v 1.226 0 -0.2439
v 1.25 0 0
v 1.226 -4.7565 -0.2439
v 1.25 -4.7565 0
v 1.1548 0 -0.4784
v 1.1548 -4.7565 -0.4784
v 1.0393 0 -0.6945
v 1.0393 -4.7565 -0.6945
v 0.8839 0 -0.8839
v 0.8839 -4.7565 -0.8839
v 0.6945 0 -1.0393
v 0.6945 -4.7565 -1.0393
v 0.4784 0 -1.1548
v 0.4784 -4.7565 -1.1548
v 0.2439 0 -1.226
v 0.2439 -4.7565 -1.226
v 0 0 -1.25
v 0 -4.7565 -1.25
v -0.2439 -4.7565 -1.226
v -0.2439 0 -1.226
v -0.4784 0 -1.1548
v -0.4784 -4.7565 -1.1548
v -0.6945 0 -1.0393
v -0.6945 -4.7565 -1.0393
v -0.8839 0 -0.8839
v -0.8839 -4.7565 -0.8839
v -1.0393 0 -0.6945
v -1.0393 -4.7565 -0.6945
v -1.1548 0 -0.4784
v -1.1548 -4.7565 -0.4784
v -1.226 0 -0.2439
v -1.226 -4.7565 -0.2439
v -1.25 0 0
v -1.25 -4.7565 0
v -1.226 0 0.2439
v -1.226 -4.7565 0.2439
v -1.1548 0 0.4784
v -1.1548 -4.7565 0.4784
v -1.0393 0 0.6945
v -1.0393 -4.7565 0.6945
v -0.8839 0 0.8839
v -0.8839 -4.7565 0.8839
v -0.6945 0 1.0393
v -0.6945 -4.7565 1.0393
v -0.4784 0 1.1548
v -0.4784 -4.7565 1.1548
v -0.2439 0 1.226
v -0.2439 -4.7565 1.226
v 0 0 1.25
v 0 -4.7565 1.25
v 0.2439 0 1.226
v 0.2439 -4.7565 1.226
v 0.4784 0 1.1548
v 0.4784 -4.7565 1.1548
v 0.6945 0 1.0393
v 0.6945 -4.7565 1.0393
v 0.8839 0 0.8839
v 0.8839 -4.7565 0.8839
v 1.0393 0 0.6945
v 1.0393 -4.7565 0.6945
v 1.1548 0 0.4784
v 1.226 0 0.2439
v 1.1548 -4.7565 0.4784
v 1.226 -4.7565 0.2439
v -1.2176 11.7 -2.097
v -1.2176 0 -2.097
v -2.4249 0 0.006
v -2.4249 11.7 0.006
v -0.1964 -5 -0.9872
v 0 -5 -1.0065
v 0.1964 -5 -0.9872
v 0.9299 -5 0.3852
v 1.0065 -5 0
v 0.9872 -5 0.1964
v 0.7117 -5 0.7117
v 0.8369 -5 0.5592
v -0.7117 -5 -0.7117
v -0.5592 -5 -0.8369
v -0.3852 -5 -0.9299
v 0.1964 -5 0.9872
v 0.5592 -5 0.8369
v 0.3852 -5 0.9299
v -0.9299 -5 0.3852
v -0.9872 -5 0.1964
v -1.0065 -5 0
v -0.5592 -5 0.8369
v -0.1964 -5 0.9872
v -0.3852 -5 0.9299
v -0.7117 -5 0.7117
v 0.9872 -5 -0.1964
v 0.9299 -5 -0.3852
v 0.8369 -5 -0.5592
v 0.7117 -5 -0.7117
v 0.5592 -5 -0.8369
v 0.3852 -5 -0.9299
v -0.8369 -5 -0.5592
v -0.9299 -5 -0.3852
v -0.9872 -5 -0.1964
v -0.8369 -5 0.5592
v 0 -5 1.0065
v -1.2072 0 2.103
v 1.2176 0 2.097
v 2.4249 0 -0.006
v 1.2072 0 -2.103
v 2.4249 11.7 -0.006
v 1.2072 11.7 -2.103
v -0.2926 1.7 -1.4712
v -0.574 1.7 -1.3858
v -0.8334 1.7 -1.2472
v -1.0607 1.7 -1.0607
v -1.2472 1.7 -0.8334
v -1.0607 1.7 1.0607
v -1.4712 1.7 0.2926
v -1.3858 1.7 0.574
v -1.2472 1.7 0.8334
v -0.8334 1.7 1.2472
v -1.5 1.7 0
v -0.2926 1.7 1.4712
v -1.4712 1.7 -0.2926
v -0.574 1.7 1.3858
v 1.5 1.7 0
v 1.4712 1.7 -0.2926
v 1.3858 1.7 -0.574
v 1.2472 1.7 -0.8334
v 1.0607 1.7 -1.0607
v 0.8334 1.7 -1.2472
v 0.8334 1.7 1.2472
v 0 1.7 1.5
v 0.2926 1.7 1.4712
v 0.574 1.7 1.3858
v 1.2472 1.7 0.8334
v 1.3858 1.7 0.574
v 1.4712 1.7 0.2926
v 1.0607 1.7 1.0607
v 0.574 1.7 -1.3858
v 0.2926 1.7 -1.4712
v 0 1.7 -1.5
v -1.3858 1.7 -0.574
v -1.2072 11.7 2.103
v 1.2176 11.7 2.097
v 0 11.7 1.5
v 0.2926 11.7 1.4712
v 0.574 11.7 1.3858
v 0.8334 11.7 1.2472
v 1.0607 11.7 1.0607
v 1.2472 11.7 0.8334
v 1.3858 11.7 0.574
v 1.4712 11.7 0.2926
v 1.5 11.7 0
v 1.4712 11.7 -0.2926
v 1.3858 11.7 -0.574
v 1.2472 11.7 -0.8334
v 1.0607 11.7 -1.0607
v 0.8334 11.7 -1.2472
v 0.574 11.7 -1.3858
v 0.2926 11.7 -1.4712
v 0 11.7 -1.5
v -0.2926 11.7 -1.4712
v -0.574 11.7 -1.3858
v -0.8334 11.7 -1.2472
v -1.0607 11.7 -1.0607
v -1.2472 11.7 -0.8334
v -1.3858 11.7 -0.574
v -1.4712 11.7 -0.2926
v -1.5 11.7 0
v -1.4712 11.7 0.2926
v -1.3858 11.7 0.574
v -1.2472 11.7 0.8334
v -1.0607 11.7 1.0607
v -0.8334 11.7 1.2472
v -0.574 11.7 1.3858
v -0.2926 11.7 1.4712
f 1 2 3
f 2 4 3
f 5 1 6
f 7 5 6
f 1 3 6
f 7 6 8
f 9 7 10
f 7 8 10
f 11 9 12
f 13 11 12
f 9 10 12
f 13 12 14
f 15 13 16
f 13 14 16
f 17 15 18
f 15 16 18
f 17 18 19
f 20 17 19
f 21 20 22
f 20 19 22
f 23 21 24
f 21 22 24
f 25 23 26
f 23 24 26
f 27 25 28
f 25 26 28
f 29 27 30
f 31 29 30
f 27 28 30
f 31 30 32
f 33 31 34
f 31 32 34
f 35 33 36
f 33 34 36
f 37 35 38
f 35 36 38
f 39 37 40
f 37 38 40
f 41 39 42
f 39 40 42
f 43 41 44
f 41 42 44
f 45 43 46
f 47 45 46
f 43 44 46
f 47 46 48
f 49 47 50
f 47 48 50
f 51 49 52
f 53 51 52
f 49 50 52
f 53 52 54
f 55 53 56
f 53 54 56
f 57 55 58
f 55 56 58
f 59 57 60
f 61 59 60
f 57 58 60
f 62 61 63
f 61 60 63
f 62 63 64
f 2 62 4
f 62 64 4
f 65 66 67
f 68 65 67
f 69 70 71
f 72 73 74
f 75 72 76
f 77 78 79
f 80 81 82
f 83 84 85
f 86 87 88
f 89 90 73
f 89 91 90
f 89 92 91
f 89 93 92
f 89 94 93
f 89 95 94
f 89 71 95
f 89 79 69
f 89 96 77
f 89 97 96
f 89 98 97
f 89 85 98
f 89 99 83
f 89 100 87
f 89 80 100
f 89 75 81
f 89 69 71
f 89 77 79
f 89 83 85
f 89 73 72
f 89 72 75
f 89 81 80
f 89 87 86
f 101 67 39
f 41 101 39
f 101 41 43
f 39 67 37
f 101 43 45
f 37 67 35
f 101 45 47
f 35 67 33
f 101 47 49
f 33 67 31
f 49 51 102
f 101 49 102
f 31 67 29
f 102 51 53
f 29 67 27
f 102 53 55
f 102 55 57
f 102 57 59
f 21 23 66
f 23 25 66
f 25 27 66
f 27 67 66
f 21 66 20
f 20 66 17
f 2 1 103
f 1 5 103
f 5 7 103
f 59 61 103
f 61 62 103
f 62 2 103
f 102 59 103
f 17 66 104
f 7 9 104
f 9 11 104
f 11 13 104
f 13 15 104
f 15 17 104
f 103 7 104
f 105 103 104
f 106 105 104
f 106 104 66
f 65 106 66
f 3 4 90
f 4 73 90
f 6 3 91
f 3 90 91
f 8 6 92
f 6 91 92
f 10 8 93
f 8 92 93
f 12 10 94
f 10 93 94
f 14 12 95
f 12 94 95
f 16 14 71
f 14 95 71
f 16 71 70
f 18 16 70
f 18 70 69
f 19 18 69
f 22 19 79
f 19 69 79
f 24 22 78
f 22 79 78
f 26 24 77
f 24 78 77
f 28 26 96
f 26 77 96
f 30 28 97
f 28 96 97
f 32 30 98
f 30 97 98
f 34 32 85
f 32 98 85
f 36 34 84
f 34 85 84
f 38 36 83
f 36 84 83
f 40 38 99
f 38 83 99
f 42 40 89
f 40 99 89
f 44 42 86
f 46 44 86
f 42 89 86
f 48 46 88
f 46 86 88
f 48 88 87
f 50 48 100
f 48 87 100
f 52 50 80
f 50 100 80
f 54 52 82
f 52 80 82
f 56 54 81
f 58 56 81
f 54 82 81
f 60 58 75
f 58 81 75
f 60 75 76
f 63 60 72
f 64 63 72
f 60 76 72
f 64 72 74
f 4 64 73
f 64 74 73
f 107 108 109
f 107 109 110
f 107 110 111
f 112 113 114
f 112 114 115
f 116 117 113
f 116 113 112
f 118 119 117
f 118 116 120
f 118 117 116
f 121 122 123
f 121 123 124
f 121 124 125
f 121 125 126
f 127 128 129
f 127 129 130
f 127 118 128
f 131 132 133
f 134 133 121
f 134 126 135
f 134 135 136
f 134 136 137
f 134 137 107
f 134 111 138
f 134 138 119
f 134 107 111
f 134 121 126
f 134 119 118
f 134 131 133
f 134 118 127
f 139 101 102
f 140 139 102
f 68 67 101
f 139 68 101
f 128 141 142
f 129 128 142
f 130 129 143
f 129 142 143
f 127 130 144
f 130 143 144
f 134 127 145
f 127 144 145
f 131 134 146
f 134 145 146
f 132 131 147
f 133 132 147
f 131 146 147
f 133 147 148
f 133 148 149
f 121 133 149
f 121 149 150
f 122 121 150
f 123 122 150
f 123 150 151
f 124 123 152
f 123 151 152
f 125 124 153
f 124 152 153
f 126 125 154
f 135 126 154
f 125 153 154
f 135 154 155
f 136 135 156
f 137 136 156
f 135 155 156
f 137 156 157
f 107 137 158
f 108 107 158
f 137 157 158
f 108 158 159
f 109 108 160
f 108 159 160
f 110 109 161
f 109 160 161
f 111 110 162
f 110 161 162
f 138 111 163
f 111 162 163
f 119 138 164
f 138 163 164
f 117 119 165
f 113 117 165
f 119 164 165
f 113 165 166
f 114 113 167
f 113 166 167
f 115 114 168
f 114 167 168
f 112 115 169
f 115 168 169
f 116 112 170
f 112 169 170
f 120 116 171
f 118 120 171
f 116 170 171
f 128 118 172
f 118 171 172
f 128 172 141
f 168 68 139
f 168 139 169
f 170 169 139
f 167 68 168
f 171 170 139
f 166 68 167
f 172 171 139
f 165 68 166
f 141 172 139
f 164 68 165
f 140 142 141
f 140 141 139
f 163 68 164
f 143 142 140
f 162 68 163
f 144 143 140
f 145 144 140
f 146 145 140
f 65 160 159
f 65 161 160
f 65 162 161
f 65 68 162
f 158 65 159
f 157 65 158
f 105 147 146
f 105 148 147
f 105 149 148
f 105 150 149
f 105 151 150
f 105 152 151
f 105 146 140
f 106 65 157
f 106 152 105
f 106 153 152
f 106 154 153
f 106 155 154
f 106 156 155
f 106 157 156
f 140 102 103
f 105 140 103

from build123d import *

# Parameters (mm, degrees)
EXTRUDE_1_DEPTH     = 11.7
SKETCH_2_R          = 1.5
CUT_EXTRUDE_1_DEPTH = 10
SKETCH_3_R          = 1.5
EXTRUDE_2_DEPTH     = 5


# Read off the part's stored shape, not the designer's step: M2.5 机械螺纹 螺柱1
with BuildPart() as part:
    # 草图1 → 凸台-拉伸1 (new body)
    with BuildSketch(Plane(origin=(0, 0, 0), x_dir=(1, 0, 0), z_dir=(0, 1, 0))):
        Polygon((-1.21761392, 2.097001751), (-2.424863748, -0.005983711), (-1.207249828, -2.102985462), (1.21761392, -2.097001751), (2.424863748, 0.005983711), (1.207249828, 2.102985462), align=None)
    extrude(amount=EXTRUDE_1_DEPTH)

    # 草图2 → 切除-拉伸1 (cut)
    with BuildSketch(Plane(origin=(0, 11.7, 0), x_dir=(1, 0, 0), z_dir=(0, 1, 0))):
        with Locations(Location((0, 0, 0), (0, 0, 270))):
            Circle(SKETCH_2_R)
    extrude(amount=-CUT_EXTRUDE_1_DEPTH, mode=Mode.SUBTRACT)

    # 草图3 → 凸台-拉伸2 (add)
    with BuildSketch(Plane.XZ):
        with Locations(Location((0, 0, 0), (0, 0, 90))):
            Circle(SKETCH_3_R)
    extrude(amount=EXTRUDE_2_DEPTH)

    # M2.5 机械螺纹 螺柱1 outline → M2.5 机械螺纹 螺柱1 (revolve, cut)
    with BuildSketch(Plane.XY):
        Polygon((1.5, 0), (1.25, 0), (1.25, -4.7565), (1.0065, -5), (1.5, -5), align=None)
    revolve(axis=Axis((0, 0, 0), (0, 1, 0)), mode=Mode.SUBTRACT)


solid = part.part
